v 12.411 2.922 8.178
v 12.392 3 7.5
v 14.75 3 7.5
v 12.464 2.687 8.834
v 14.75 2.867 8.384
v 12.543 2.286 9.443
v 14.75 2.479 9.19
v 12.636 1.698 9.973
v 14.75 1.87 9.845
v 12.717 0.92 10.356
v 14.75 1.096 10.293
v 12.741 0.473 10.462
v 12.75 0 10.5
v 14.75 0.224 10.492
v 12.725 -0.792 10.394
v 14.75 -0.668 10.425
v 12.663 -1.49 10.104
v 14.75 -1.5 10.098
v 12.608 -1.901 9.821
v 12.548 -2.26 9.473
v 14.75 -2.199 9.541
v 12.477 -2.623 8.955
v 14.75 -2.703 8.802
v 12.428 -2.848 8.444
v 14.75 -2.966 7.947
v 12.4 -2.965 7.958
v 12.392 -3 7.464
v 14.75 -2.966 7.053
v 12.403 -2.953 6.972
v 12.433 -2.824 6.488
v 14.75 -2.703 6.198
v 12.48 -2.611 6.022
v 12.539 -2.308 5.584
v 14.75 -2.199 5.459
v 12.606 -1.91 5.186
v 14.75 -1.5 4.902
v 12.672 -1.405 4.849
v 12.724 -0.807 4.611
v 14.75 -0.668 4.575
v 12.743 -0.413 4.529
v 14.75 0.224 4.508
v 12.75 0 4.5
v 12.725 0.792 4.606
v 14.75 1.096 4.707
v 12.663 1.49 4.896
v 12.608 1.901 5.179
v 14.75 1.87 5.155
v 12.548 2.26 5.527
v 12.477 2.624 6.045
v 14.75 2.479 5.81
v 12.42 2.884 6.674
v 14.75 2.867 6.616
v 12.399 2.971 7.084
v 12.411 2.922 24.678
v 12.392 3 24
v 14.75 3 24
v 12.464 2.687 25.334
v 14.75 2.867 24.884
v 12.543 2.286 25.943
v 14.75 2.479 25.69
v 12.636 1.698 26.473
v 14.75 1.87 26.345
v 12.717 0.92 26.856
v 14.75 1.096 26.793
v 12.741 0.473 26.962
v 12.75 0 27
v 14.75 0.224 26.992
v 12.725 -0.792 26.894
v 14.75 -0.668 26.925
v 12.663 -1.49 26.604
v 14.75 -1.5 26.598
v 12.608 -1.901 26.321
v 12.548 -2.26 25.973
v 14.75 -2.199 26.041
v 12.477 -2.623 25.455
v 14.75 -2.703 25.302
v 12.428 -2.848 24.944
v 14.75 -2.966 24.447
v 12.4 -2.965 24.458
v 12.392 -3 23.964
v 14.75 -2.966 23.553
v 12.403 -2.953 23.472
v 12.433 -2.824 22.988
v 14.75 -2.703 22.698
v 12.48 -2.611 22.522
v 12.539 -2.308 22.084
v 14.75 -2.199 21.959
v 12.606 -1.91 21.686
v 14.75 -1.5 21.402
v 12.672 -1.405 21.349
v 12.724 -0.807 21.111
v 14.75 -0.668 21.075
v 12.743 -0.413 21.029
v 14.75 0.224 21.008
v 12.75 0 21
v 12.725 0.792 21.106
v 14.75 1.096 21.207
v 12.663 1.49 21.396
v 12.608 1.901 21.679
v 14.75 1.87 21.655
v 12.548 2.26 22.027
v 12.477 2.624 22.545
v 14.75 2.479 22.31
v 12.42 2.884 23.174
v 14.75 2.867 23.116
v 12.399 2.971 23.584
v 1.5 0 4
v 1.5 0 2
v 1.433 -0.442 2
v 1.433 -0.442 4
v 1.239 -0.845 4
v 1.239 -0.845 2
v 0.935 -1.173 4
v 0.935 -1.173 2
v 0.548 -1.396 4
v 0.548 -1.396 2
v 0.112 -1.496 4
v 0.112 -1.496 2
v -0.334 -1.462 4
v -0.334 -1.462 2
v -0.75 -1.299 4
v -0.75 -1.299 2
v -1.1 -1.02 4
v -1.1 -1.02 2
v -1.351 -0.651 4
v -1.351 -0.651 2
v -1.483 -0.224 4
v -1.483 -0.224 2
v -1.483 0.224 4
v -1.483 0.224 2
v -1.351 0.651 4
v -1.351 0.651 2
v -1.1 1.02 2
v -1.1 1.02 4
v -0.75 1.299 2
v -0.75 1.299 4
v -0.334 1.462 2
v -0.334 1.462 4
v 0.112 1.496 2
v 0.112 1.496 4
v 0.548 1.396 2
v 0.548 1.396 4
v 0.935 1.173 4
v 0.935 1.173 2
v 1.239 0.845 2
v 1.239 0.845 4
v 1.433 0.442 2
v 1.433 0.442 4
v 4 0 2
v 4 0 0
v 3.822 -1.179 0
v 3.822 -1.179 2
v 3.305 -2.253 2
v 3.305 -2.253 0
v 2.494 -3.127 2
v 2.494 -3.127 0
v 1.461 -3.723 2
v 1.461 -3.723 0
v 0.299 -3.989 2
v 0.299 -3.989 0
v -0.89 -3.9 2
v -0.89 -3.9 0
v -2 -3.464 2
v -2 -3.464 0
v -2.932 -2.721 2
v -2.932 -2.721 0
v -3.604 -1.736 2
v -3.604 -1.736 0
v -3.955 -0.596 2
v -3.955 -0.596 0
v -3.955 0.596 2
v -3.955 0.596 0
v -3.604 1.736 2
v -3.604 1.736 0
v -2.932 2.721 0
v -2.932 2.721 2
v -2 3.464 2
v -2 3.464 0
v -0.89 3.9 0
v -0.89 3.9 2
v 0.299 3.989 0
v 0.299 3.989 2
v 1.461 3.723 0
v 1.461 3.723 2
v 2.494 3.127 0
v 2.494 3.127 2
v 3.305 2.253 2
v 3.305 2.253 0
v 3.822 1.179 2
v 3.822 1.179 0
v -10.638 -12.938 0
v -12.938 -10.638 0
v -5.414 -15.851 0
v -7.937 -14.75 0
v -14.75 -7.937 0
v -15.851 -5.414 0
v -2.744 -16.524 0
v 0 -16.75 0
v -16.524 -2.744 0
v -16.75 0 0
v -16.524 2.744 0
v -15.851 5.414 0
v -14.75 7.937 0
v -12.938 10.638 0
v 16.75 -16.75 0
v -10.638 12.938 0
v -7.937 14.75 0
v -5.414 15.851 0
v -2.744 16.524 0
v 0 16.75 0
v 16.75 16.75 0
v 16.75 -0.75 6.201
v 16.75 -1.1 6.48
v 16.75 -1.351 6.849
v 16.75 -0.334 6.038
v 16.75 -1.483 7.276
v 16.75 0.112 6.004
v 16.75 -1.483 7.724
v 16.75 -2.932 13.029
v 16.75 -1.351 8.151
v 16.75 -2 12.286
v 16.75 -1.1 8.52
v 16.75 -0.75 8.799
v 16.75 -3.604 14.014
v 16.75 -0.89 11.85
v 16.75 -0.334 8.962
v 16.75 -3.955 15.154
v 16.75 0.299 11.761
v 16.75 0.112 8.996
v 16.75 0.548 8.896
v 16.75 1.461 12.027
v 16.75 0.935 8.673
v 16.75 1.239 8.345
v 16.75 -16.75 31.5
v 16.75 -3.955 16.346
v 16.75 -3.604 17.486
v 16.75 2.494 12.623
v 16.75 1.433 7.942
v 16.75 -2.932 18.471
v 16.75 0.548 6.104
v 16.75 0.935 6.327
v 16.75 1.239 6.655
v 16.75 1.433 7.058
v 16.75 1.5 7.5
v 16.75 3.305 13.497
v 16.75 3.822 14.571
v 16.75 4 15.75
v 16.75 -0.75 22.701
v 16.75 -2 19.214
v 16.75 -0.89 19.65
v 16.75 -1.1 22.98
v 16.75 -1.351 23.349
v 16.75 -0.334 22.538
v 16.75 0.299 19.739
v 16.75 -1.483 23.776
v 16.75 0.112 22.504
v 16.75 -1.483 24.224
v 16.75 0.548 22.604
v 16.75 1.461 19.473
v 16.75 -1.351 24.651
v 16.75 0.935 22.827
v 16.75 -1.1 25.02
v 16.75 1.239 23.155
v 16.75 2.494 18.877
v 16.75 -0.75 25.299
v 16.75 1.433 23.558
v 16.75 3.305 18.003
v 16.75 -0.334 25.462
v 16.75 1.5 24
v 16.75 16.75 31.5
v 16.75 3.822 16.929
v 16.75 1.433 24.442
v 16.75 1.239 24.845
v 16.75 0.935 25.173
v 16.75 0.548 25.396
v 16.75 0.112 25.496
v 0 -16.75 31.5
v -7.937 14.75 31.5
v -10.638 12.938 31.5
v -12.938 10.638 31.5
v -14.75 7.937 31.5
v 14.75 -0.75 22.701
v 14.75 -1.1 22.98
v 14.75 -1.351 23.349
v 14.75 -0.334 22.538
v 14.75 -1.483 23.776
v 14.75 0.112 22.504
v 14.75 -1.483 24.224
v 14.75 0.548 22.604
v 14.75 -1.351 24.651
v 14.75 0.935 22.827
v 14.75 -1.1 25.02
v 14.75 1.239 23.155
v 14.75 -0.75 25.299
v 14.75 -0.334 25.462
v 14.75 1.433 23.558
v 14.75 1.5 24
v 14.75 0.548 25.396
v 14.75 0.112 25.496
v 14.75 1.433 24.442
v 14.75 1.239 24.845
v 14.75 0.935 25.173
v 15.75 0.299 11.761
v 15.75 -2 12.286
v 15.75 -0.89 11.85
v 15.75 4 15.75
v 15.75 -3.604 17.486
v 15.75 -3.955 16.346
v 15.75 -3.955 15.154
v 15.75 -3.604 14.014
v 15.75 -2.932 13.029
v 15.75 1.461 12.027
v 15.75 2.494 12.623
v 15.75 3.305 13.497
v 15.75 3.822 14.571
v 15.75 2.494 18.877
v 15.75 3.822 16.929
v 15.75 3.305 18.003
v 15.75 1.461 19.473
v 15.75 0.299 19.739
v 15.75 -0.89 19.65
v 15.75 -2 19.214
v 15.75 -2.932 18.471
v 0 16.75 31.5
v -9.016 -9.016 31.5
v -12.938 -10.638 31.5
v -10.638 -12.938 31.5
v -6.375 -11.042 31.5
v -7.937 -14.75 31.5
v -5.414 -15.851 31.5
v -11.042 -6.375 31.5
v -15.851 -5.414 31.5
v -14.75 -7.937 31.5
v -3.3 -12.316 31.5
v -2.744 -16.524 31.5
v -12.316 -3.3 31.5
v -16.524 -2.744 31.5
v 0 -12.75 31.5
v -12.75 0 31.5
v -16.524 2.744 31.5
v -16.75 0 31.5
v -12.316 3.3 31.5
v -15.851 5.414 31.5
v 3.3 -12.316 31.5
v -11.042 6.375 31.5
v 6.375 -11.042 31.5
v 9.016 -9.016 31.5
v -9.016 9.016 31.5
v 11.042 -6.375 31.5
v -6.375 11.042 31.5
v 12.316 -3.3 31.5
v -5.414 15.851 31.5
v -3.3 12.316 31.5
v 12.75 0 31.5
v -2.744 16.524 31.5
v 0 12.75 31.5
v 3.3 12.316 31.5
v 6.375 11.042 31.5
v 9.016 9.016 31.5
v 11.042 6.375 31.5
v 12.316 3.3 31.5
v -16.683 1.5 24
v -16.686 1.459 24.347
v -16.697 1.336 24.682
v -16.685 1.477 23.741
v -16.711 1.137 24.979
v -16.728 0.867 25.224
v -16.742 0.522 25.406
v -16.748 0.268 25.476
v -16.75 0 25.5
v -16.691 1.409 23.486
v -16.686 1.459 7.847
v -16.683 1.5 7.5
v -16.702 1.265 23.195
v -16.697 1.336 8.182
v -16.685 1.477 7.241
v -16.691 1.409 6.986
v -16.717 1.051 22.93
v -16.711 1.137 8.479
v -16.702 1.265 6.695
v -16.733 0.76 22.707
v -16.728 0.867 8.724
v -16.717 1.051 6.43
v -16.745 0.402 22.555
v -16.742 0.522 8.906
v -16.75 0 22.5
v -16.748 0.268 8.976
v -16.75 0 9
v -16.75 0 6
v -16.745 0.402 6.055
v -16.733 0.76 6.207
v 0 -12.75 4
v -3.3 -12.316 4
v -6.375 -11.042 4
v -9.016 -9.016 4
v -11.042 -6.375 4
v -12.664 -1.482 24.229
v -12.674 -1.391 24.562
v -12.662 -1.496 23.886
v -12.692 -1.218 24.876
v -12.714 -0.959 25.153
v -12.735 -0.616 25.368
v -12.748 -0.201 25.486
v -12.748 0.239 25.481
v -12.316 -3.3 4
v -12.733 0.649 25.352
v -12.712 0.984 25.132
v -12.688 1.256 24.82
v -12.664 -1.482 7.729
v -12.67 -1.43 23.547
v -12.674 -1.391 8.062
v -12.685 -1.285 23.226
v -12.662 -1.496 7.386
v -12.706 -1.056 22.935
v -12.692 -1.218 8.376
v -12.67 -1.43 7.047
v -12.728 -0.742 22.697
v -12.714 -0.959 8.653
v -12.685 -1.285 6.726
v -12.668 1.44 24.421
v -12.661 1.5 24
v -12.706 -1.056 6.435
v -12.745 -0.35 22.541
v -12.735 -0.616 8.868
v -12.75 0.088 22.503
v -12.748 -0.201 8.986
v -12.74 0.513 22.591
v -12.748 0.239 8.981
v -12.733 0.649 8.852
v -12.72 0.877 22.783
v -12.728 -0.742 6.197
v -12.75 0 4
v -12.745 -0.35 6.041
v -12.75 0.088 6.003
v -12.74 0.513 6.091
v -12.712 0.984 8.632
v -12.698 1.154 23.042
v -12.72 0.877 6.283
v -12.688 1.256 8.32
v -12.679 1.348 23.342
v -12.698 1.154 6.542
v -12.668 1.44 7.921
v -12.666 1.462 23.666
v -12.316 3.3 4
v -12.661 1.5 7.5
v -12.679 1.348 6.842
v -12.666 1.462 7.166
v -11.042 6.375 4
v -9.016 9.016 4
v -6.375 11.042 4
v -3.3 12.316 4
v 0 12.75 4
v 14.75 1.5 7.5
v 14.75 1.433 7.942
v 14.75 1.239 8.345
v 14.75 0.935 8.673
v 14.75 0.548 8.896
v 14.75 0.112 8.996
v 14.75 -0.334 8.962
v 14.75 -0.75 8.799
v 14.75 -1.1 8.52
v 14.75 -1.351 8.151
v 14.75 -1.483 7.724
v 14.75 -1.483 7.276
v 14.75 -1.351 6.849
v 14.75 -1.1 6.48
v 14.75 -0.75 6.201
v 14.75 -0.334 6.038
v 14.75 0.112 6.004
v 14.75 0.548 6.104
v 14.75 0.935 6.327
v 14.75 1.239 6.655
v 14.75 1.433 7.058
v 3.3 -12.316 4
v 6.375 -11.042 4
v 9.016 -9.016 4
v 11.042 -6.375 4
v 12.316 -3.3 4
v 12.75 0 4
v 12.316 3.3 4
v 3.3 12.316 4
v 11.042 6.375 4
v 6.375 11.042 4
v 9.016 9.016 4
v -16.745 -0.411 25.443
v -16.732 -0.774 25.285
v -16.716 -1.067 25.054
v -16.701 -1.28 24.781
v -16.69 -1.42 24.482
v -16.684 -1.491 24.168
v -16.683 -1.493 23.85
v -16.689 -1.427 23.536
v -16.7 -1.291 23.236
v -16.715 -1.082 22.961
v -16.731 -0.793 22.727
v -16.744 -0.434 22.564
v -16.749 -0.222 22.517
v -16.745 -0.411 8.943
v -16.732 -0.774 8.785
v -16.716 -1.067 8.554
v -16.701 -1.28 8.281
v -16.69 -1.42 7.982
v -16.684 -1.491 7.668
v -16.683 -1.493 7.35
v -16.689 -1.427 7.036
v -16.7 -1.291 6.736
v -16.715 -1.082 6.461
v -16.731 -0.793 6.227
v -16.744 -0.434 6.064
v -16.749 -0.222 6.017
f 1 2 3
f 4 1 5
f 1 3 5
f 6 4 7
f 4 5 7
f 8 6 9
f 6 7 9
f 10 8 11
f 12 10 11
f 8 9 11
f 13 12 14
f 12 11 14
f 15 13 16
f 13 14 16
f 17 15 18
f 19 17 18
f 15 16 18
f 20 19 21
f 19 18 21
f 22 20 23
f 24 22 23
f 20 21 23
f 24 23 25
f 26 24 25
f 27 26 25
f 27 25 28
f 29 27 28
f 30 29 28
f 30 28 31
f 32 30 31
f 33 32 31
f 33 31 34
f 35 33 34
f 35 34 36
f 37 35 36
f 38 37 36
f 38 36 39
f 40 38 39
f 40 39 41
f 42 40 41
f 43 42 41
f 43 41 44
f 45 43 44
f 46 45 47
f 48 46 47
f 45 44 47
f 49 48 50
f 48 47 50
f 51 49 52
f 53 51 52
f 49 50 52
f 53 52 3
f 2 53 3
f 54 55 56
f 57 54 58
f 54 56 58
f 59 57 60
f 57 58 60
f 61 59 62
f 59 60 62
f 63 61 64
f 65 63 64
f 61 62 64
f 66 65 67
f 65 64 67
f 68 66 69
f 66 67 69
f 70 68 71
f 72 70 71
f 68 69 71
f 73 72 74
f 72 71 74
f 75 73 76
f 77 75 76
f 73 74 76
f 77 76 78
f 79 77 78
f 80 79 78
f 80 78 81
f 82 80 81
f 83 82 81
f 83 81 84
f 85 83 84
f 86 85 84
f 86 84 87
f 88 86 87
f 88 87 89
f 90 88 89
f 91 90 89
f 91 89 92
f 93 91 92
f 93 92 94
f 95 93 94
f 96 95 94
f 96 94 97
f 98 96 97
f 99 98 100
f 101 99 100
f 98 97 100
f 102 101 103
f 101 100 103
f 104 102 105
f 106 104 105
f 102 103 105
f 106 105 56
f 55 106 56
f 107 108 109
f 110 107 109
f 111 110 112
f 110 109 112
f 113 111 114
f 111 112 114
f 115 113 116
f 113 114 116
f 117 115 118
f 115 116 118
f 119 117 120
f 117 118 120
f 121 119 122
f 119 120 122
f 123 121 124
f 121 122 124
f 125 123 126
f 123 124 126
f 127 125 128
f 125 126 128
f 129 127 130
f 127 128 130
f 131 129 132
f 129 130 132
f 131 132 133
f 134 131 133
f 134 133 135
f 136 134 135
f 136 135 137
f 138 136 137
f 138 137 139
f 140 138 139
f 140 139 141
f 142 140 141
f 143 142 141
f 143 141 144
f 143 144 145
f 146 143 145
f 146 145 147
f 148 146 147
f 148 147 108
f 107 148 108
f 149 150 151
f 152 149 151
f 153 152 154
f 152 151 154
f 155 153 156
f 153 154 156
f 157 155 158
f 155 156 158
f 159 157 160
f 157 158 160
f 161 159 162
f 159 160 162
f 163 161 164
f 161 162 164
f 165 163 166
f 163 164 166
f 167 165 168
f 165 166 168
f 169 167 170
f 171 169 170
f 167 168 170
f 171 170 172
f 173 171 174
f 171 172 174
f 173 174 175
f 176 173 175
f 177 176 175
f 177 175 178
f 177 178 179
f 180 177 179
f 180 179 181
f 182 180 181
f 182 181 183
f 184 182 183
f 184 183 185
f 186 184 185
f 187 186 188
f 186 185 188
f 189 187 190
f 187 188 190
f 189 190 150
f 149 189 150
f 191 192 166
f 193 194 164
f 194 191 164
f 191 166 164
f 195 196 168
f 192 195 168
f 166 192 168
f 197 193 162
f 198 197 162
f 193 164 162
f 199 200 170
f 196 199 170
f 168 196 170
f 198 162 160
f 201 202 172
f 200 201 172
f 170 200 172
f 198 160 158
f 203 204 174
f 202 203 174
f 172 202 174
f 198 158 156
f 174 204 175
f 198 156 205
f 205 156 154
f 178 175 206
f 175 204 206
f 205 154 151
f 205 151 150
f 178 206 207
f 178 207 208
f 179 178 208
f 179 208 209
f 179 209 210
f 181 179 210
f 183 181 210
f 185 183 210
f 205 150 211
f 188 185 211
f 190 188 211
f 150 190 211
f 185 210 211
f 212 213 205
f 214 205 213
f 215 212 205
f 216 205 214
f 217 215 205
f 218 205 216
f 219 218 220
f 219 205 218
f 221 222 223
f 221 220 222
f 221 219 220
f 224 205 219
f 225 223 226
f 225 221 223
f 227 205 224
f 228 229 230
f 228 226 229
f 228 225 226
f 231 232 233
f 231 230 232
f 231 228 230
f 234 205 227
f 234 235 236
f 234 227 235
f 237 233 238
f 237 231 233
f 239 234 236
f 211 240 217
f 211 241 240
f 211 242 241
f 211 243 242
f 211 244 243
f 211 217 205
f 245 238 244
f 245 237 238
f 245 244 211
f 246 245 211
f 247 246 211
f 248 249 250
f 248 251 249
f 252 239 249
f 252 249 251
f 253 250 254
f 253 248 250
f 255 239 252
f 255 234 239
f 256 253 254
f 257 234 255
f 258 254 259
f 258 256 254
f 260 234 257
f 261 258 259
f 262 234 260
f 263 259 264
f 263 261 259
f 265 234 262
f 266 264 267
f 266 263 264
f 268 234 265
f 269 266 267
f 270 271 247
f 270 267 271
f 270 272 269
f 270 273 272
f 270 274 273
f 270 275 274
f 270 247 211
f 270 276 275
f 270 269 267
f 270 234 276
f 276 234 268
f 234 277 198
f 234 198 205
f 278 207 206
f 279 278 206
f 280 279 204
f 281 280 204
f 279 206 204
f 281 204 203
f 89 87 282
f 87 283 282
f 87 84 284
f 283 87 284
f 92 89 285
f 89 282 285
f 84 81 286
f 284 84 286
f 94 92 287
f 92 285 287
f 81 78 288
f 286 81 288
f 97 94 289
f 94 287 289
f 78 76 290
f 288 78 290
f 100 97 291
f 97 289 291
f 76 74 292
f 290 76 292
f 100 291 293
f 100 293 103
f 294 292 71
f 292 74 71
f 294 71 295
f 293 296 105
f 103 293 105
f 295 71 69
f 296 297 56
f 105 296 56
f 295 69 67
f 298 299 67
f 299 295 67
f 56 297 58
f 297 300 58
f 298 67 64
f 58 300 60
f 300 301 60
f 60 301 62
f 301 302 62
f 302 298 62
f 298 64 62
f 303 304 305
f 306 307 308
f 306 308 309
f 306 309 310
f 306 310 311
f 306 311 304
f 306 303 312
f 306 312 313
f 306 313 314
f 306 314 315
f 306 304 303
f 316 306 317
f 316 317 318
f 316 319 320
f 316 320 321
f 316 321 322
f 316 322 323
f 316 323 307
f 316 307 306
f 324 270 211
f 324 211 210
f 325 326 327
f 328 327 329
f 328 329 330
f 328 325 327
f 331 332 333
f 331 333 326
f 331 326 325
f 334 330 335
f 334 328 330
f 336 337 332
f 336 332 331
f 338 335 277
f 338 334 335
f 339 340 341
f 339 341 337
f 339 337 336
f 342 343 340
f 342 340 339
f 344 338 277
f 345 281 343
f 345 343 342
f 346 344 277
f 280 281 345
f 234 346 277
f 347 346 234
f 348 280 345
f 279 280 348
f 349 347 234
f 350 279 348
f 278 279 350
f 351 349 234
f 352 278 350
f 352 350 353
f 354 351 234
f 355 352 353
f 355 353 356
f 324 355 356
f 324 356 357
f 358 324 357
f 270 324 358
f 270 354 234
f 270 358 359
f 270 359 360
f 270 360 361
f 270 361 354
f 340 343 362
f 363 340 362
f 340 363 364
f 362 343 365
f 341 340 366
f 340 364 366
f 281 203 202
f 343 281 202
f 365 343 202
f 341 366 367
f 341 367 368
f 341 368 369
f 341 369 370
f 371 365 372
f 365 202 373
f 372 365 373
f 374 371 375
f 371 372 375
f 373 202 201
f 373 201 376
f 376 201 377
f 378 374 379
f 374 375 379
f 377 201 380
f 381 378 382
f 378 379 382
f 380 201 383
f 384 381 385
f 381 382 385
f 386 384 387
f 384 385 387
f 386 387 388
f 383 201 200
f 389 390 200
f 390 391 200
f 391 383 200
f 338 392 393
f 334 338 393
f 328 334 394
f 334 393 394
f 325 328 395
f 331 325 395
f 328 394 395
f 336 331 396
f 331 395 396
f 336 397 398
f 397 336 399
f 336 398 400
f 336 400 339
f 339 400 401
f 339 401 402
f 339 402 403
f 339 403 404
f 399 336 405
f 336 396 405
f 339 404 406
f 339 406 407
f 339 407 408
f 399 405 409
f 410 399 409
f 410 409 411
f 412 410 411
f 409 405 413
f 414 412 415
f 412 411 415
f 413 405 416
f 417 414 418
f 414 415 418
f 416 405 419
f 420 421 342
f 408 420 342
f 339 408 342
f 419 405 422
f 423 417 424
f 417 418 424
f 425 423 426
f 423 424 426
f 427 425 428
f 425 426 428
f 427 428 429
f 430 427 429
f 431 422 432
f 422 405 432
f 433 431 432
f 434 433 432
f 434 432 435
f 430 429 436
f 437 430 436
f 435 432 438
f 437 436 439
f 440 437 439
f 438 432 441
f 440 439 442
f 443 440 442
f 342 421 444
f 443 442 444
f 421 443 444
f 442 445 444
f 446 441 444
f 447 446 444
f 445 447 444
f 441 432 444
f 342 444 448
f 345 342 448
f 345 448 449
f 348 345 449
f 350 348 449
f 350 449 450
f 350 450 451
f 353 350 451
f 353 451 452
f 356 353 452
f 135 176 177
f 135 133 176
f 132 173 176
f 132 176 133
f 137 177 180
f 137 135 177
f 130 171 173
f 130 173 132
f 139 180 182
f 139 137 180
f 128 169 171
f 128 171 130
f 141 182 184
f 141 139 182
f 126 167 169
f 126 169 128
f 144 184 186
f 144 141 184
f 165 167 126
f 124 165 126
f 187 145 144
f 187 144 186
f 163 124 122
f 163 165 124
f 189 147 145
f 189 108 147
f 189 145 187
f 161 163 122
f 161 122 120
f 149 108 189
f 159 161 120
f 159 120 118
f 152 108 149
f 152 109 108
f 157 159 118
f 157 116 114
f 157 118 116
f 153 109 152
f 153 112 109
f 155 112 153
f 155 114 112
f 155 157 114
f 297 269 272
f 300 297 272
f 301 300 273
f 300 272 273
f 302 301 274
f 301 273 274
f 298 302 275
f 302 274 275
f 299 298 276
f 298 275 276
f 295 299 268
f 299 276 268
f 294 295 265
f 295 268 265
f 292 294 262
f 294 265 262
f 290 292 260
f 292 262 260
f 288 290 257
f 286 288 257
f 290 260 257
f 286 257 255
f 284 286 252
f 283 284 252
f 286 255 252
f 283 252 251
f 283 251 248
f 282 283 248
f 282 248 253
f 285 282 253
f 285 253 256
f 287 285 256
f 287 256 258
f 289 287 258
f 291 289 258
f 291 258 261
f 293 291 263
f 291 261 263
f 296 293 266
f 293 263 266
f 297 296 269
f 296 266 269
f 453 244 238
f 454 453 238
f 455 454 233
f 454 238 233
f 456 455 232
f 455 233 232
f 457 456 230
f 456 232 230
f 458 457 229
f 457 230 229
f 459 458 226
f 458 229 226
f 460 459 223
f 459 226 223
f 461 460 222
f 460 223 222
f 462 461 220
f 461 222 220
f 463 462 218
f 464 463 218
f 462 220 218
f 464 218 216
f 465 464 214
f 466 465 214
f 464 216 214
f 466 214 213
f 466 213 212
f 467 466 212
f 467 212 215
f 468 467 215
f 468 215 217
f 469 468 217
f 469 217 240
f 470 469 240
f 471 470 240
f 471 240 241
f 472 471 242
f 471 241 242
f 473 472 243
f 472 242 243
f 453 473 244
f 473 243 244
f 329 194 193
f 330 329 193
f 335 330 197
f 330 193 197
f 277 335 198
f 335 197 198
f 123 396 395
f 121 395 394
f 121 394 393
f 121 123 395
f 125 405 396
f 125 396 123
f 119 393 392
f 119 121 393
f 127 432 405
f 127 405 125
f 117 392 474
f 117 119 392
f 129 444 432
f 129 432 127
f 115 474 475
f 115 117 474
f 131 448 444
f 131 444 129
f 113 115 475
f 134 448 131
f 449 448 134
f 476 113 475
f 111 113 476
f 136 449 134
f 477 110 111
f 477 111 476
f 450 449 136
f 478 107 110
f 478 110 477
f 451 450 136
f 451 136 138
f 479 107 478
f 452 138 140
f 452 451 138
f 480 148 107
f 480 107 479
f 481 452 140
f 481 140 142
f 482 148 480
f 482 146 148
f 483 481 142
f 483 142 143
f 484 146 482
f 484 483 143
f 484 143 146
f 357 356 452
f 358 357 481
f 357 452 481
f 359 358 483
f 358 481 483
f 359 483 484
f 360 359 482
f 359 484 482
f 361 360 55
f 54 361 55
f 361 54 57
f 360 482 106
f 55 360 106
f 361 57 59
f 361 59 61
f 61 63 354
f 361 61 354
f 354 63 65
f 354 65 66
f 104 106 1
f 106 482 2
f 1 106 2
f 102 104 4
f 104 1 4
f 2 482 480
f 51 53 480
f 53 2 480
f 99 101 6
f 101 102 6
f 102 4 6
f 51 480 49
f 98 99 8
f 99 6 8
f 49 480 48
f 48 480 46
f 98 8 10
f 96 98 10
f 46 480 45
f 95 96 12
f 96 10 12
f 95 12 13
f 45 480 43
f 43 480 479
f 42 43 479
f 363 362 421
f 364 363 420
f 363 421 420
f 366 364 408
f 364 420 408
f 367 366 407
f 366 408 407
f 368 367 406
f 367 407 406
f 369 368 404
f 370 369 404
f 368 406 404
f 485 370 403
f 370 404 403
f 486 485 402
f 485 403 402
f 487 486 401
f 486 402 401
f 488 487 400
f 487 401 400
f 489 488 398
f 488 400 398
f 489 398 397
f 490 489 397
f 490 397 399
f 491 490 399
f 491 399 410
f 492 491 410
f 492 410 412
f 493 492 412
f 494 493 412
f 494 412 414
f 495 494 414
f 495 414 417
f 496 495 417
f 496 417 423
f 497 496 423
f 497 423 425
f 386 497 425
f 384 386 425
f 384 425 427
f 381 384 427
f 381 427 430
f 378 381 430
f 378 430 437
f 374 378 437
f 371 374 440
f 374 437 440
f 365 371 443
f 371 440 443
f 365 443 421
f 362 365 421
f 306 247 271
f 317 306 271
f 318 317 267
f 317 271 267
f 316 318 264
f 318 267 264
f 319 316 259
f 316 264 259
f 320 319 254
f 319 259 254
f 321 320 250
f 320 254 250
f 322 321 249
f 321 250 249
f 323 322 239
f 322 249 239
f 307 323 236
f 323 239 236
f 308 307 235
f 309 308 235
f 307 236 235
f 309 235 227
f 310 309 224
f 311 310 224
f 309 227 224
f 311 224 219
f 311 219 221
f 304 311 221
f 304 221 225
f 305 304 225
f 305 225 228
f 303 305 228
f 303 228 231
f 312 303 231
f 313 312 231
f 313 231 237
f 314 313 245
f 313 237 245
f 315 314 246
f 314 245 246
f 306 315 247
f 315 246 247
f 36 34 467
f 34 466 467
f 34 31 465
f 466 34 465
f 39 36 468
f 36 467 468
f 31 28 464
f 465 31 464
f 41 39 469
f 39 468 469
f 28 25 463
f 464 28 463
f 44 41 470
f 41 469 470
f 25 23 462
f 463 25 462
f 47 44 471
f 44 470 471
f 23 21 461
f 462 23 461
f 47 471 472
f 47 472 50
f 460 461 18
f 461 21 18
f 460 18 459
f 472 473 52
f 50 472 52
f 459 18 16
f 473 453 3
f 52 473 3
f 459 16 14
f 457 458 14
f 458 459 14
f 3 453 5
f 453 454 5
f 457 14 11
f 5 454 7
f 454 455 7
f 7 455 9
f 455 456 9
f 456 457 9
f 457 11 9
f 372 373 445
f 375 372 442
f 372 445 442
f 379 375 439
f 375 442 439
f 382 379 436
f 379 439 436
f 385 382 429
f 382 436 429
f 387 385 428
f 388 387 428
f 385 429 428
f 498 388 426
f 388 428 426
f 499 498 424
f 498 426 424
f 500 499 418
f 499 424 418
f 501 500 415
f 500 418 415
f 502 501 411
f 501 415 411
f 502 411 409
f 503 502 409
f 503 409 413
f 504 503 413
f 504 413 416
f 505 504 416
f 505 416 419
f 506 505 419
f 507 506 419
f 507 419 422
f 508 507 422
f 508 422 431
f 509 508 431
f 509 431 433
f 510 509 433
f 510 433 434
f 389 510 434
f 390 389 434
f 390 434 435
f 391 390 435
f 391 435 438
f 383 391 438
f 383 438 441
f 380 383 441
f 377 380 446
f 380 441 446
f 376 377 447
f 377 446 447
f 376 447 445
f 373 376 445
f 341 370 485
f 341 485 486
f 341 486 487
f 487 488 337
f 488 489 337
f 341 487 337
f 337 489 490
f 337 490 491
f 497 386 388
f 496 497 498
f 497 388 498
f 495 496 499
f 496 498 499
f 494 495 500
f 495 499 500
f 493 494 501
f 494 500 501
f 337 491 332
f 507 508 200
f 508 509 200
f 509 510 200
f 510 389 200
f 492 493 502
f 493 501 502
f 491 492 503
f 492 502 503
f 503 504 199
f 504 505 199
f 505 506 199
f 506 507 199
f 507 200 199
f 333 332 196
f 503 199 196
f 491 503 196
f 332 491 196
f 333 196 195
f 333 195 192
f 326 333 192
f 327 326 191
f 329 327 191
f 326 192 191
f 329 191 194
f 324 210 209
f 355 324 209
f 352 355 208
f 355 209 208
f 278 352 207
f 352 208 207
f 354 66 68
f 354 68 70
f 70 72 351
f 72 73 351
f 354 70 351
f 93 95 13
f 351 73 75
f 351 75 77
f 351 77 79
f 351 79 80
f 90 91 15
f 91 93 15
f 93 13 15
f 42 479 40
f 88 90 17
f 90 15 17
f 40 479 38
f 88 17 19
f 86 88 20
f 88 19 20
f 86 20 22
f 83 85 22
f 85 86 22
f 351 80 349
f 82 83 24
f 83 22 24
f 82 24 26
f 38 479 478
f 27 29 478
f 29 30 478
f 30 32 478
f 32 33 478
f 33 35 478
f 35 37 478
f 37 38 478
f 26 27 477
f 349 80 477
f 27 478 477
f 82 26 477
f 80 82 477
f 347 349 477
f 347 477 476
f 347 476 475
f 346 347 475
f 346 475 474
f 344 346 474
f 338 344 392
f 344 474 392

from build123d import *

# Parameters (mm, degrees)
F1_DEPTH  = 31.5
F2_R      = 3
F2_R_2    = 1.5
F3_DEPTH  = 5
F4_DEPTH  = 2
F2_R_3    = 4
F5_DEPTH  = 1
F6_DEPTH  = 4
F7_R      = 1.5
F8_DEPTH  = 31.5010001
F7_R_2    = 4
F9_DEPTH  = 2
F10_DEPTH = 33.501


with BuildPart() as f1:
    # F0 (on Top) → F1 (new body)
    with BuildSketch(Plane.XY):
        with BuildLine():
            Line((7.9372539332, -14.75), (0, -14.75))
            Line((0, -14.75), (0, -16.75))
            ThreePointArc((0, -16.75), (4.0926763859, -16.2423058708), (7.9372539332, -14.75))
        make_face()
        with BuildLine():
            ThreePointArc((16.75, 0), (16.2423058708, -4.0926763859), (14.75, -7.9372539332))
            Line((14.75, -7.9372539332), (14.75, -14.75))
            Line((14.75, -14.75), (7.9372539332, -14.75))
            ThreePointArc((7.9372539332, -14.75), (4.0926763859, -16.2423058708), (0, -16.75))
            Line((0, -16.75), (16.75, -16.75))
            Line((16.75, -16.75), (16.75, 0))
        make_face()
        with BuildLine():
            Line((14.75, -14.75), (14.75, -7.9372539332))
            ThreePointArc((14.75, -7.9372539332), (11.8440385849, -11.8440385849), (7.9372539332, -14.75))
            Line((7.9372539332, -14.75), (14.75, -14.75))
        make_face()
        with BuildLine():
            Line((14.75, -7.9372539332), (14.75, 0))
            ThreePointArc((14.75, 0), (10.4298250225, -10.4298250225), (0, -14.75))
            Line((0, -14.75), (7.9372539332, -14.75))
            ThreePointArc((7.9372539332, -14.75), (11.8440385849, -11.8440385849), (14.75, -7.9372539332))
        make_face()
        with BuildLine():
            ThreePointArc((0, -14.75), (10.4298250225, -10.4298250225), (14.75, 0))
            ThreePointArc((14.75, 0), (10.4298250225, 10.4298250225), (0, 14.75))
            Line((0, 14.75), (0, 12.75))
            ThreePointArc((0, 12.75), (9.0156114601, 9.0156114601), (12.75, 0))
            ThreePointArc((12.75, 0), (9.0156114601, -9.0156114601), (0, -12.75))
            Line((0, -12.75), (0, -14.75))
        make_face()
        with BuildLine():
            Line((14.75, 7.9372539332), (14.75, 0))
            Line((14.75, 0), (14.75, -7.9372539332))
            ThreePointArc((14.75, -7.9372539332), (16.2423058708, -4.0926763859), (16.75, 0))
            ThreePointArc((16.75, 0), (16.2423058708, 4.0926763859), (14.75, 7.9372539332))
        make_face()
        with BuildLine():
            ThreePointArc((0, 14.75), (10.4298250225, 10.4298250225), (14.75, 0))
            Line((14.75, 0), (14.75, 7.9372539332))
            ThreePointArc((14.75, 7.9372539332), (11.8440385849, 11.8440385849), (7.9372539332, 14.75))
            Line((7.9372539332, 14.75), (0, 14.75))
        make_face()
        with BuildLine():
            Line((14.75, 14.75), (14.75, 7.9372539332))
            ThreePointArc((14.75, 7.9372539332), (16.2423058708, 4.0926763859), (16.75, 0))
            Line((16.75, 0), (16.75, 16.75))
            Line((16.75, 16.75), (0, 16.75))
            ThreePointArc((0, 16.75), (4.0926763859, 16.2423058708), (7.9372539332, 14.75))
            Line((7.9372539332, 14.75), (14.75, 14.75))
        make_face()
        with BuildLine():
            ThreePointArc((7.9372539332, 14.75), (11.8440385849, 11.8440385849), (14.75, 7.9372539332))
            Line((14.75, 7.9372539332), (14.75, 14.75))
            Line((14.75, 14.75), (7.9372539332, 14.75))
        make_face()
        with BuildLine():
            Line((0, 16.75), (0, 14.75))
            Line((0, 14.75), (7.9372539332, 14.75))
            ThreePointArc((7.9372539332, 14.75), (4.0926763859, 16.2423058708), (0, 16.75))
        make_face()
        with BuildLine():
            Line((0, 12.75), (0, 14.75))
            ThreePointArc((0, 14.75), (-10.4298250296, 10.4298250154), (-14.75, -2e-08))
            ThreePointArc((-14.75, -2e-08), (-10.4298250154, -10.4298250296), (0, -14.75))
            Line((0, -14.75), (0, -12.75))
            ThreePointArc((0, -12.75), (-12.75, 0), (0, 12.75))
        make_face()
        with BuildLine():
            ThreePointArc((-14.75, -2e-08), (-10.4298250296, 10.4298250154), (0, 14.75))
            Line((0, 14.75), (-7.9372539332, 14.75))
            ThreePointArc((-7.9372539332, 14.75), (-11.8440385849, 11.8440385849), (-14.75, 7.9372539332))
            Line((-14.75, 7.9372539332), (-14.75, -2e-08))
        make_face()
        with BuildLine():
            Line((-7.9372539332, 14.75), (0, 14.75))
            Line((0, 14.75), (0, 16.75))
            ThreePointArc((0, 16.75), (-4.0926763859, 16.2423058708), (-7.9372539332, 14.75))
        make_face()
        with BuildLine():
            Line((-14.75, -7.9372539332), (-14.75, -2e-08))
            Line((-14.75, -2e-08), (-14.75, 7.9372539332))
            ThreePointArc((-14.75, 7.9372539332), (-16.2423058693, 4.092676392), (-16.75, 1.25e-08))
            ThreePointArc((-16.75, 1.25e-08), (-16.2423058723, -4.0926763799), (-14.75, -7.9372539332))
        make_face()
        with BuildLine():
            Line((-7.9372539332, -14.75), (0, -14.75))
            ThreePointArc((0, -14.75), (-10.4298250154, -10.4298250296), (-14.75, -2e-08))
            Line((-14.75, -2e-08), (-14.75, -7.9372539332))
            ThreePointArc((-14.75, -7.9372539332), (-11.8440385849, -11.8440385849), (-7.9372539332, -14.75))
        make_face()
        with BuildLine():
            Line((0, -16.75), (0, -14.75))
            Line((0, -14.75), (-7.9372539332, -14.75))
            ThreePointArc((-7.9372539332, -14.75), (-4.0926763859, -16.2423058708), (0, -16.75))
        make_face()
    extrude(amount=F1_DEPTH)

    # F2 (on face) → F3 (cut)
    with BuildSketch(Plane.YZ.offset(16.75)):
        with Locations((0, 24)):
            Circle(F2_R)
        with Locations((0, 24)):
            Circle(F2_R_2, mode=Mode.SUBTRACT)
        with Locations((0, 7.5)):
            Circle(F2_R)
        with Locations((0, 7.5)):
            Circle(F2_R_2, mode=Mode.SUBTRACT)
        with Locations((0, 24)):
            Circle(F2_R_2)
        with Locations((0, 7.5)):
            Circle(F2_R_2)
    extrude(amount=-F3_DEPTH, mode=Mode.SUBTRACT)

    # F2 (on face) → F4 (join)
    with BuildSketch(Plane.YZ.offset(16.75)):
        with Locations((0, 24)):
            Circle(F2_R)
        with Locations((0, 24)):
            Circle(F2_R_2, mode=Mode.SUBTRACT)
        with Locations((0, 7.5)):
            Circle(F2_R)
        with Locations((0, 7.5)):
            Circle(F2_R_2, mode=Mode.SUBTRACT)
    extrude(amount=-F4_DEPTH)

    # F2 (on face) → F5 (cut)
    with BuildSketch(Plane.YZ.offset(16.75)):
        with Locations((0, 15.75)):
            Circle(F2_R_3)
    extrude(amount=-F5_DEPTH, mode=Mode.SUBTRACT)

    # F0 (on Top) → F6 (join)
    with BuildSketch(Plane.XY):
        with BuildLine():
            ThreePointArc((12.75, 0), (9.0156114601, 9.0156114601), (0, 12.75))
            Line((0, 12.75), (0, -12.75))
            ThreePointArc((0, -12.75), (9.0156114601, -9.0156114601), (12.75, 0))
        make_face()
        with BuildLine():
            Line((0, -12.75), (0, 12.75))
            ThreePointArc((0, 12.75), (-12.75, 0), (0, -12.75))
        make_face()
    extrude(amount=F6_DEPTH)

    # F7 (on face) → F8 (cut, through all)
    with BuildSketch(Plane(origin=(0, 0, 0), x_dir=(1, 0, 0), z_dir=(0, 0, -1))):
        Circle(F7_R)
    extrude(amount=-F8_DEPTH, mode=Mode.SUBTRACT)

    # F7 (on face) → F9 (cut)
    with BuildSketch(Plane(origin=(0, 0, 0), x_dir=(1, 0, 0), z_dir=(0, 0, -1))):
        Circle(F7_R_2)
        Circle(F7_R, mode=Mode.SUBTRACT)
    extrude(amount=-F9_DEPTH, mode=Mode.SUBTRACT)

    # F2 (on face) → F10 (cut, through all)
    with BuildSketch(Plane.YZ.offset(16.75)):
        with Locations((0, 24)):
            Circle(F2_R_2)
        with Locations((0, 7.5)):
            Circle(F2_R_2)
    extrude(amount=-F10_DEPTH, mode=Mode.SUBTRACT)


solid = f1.part
